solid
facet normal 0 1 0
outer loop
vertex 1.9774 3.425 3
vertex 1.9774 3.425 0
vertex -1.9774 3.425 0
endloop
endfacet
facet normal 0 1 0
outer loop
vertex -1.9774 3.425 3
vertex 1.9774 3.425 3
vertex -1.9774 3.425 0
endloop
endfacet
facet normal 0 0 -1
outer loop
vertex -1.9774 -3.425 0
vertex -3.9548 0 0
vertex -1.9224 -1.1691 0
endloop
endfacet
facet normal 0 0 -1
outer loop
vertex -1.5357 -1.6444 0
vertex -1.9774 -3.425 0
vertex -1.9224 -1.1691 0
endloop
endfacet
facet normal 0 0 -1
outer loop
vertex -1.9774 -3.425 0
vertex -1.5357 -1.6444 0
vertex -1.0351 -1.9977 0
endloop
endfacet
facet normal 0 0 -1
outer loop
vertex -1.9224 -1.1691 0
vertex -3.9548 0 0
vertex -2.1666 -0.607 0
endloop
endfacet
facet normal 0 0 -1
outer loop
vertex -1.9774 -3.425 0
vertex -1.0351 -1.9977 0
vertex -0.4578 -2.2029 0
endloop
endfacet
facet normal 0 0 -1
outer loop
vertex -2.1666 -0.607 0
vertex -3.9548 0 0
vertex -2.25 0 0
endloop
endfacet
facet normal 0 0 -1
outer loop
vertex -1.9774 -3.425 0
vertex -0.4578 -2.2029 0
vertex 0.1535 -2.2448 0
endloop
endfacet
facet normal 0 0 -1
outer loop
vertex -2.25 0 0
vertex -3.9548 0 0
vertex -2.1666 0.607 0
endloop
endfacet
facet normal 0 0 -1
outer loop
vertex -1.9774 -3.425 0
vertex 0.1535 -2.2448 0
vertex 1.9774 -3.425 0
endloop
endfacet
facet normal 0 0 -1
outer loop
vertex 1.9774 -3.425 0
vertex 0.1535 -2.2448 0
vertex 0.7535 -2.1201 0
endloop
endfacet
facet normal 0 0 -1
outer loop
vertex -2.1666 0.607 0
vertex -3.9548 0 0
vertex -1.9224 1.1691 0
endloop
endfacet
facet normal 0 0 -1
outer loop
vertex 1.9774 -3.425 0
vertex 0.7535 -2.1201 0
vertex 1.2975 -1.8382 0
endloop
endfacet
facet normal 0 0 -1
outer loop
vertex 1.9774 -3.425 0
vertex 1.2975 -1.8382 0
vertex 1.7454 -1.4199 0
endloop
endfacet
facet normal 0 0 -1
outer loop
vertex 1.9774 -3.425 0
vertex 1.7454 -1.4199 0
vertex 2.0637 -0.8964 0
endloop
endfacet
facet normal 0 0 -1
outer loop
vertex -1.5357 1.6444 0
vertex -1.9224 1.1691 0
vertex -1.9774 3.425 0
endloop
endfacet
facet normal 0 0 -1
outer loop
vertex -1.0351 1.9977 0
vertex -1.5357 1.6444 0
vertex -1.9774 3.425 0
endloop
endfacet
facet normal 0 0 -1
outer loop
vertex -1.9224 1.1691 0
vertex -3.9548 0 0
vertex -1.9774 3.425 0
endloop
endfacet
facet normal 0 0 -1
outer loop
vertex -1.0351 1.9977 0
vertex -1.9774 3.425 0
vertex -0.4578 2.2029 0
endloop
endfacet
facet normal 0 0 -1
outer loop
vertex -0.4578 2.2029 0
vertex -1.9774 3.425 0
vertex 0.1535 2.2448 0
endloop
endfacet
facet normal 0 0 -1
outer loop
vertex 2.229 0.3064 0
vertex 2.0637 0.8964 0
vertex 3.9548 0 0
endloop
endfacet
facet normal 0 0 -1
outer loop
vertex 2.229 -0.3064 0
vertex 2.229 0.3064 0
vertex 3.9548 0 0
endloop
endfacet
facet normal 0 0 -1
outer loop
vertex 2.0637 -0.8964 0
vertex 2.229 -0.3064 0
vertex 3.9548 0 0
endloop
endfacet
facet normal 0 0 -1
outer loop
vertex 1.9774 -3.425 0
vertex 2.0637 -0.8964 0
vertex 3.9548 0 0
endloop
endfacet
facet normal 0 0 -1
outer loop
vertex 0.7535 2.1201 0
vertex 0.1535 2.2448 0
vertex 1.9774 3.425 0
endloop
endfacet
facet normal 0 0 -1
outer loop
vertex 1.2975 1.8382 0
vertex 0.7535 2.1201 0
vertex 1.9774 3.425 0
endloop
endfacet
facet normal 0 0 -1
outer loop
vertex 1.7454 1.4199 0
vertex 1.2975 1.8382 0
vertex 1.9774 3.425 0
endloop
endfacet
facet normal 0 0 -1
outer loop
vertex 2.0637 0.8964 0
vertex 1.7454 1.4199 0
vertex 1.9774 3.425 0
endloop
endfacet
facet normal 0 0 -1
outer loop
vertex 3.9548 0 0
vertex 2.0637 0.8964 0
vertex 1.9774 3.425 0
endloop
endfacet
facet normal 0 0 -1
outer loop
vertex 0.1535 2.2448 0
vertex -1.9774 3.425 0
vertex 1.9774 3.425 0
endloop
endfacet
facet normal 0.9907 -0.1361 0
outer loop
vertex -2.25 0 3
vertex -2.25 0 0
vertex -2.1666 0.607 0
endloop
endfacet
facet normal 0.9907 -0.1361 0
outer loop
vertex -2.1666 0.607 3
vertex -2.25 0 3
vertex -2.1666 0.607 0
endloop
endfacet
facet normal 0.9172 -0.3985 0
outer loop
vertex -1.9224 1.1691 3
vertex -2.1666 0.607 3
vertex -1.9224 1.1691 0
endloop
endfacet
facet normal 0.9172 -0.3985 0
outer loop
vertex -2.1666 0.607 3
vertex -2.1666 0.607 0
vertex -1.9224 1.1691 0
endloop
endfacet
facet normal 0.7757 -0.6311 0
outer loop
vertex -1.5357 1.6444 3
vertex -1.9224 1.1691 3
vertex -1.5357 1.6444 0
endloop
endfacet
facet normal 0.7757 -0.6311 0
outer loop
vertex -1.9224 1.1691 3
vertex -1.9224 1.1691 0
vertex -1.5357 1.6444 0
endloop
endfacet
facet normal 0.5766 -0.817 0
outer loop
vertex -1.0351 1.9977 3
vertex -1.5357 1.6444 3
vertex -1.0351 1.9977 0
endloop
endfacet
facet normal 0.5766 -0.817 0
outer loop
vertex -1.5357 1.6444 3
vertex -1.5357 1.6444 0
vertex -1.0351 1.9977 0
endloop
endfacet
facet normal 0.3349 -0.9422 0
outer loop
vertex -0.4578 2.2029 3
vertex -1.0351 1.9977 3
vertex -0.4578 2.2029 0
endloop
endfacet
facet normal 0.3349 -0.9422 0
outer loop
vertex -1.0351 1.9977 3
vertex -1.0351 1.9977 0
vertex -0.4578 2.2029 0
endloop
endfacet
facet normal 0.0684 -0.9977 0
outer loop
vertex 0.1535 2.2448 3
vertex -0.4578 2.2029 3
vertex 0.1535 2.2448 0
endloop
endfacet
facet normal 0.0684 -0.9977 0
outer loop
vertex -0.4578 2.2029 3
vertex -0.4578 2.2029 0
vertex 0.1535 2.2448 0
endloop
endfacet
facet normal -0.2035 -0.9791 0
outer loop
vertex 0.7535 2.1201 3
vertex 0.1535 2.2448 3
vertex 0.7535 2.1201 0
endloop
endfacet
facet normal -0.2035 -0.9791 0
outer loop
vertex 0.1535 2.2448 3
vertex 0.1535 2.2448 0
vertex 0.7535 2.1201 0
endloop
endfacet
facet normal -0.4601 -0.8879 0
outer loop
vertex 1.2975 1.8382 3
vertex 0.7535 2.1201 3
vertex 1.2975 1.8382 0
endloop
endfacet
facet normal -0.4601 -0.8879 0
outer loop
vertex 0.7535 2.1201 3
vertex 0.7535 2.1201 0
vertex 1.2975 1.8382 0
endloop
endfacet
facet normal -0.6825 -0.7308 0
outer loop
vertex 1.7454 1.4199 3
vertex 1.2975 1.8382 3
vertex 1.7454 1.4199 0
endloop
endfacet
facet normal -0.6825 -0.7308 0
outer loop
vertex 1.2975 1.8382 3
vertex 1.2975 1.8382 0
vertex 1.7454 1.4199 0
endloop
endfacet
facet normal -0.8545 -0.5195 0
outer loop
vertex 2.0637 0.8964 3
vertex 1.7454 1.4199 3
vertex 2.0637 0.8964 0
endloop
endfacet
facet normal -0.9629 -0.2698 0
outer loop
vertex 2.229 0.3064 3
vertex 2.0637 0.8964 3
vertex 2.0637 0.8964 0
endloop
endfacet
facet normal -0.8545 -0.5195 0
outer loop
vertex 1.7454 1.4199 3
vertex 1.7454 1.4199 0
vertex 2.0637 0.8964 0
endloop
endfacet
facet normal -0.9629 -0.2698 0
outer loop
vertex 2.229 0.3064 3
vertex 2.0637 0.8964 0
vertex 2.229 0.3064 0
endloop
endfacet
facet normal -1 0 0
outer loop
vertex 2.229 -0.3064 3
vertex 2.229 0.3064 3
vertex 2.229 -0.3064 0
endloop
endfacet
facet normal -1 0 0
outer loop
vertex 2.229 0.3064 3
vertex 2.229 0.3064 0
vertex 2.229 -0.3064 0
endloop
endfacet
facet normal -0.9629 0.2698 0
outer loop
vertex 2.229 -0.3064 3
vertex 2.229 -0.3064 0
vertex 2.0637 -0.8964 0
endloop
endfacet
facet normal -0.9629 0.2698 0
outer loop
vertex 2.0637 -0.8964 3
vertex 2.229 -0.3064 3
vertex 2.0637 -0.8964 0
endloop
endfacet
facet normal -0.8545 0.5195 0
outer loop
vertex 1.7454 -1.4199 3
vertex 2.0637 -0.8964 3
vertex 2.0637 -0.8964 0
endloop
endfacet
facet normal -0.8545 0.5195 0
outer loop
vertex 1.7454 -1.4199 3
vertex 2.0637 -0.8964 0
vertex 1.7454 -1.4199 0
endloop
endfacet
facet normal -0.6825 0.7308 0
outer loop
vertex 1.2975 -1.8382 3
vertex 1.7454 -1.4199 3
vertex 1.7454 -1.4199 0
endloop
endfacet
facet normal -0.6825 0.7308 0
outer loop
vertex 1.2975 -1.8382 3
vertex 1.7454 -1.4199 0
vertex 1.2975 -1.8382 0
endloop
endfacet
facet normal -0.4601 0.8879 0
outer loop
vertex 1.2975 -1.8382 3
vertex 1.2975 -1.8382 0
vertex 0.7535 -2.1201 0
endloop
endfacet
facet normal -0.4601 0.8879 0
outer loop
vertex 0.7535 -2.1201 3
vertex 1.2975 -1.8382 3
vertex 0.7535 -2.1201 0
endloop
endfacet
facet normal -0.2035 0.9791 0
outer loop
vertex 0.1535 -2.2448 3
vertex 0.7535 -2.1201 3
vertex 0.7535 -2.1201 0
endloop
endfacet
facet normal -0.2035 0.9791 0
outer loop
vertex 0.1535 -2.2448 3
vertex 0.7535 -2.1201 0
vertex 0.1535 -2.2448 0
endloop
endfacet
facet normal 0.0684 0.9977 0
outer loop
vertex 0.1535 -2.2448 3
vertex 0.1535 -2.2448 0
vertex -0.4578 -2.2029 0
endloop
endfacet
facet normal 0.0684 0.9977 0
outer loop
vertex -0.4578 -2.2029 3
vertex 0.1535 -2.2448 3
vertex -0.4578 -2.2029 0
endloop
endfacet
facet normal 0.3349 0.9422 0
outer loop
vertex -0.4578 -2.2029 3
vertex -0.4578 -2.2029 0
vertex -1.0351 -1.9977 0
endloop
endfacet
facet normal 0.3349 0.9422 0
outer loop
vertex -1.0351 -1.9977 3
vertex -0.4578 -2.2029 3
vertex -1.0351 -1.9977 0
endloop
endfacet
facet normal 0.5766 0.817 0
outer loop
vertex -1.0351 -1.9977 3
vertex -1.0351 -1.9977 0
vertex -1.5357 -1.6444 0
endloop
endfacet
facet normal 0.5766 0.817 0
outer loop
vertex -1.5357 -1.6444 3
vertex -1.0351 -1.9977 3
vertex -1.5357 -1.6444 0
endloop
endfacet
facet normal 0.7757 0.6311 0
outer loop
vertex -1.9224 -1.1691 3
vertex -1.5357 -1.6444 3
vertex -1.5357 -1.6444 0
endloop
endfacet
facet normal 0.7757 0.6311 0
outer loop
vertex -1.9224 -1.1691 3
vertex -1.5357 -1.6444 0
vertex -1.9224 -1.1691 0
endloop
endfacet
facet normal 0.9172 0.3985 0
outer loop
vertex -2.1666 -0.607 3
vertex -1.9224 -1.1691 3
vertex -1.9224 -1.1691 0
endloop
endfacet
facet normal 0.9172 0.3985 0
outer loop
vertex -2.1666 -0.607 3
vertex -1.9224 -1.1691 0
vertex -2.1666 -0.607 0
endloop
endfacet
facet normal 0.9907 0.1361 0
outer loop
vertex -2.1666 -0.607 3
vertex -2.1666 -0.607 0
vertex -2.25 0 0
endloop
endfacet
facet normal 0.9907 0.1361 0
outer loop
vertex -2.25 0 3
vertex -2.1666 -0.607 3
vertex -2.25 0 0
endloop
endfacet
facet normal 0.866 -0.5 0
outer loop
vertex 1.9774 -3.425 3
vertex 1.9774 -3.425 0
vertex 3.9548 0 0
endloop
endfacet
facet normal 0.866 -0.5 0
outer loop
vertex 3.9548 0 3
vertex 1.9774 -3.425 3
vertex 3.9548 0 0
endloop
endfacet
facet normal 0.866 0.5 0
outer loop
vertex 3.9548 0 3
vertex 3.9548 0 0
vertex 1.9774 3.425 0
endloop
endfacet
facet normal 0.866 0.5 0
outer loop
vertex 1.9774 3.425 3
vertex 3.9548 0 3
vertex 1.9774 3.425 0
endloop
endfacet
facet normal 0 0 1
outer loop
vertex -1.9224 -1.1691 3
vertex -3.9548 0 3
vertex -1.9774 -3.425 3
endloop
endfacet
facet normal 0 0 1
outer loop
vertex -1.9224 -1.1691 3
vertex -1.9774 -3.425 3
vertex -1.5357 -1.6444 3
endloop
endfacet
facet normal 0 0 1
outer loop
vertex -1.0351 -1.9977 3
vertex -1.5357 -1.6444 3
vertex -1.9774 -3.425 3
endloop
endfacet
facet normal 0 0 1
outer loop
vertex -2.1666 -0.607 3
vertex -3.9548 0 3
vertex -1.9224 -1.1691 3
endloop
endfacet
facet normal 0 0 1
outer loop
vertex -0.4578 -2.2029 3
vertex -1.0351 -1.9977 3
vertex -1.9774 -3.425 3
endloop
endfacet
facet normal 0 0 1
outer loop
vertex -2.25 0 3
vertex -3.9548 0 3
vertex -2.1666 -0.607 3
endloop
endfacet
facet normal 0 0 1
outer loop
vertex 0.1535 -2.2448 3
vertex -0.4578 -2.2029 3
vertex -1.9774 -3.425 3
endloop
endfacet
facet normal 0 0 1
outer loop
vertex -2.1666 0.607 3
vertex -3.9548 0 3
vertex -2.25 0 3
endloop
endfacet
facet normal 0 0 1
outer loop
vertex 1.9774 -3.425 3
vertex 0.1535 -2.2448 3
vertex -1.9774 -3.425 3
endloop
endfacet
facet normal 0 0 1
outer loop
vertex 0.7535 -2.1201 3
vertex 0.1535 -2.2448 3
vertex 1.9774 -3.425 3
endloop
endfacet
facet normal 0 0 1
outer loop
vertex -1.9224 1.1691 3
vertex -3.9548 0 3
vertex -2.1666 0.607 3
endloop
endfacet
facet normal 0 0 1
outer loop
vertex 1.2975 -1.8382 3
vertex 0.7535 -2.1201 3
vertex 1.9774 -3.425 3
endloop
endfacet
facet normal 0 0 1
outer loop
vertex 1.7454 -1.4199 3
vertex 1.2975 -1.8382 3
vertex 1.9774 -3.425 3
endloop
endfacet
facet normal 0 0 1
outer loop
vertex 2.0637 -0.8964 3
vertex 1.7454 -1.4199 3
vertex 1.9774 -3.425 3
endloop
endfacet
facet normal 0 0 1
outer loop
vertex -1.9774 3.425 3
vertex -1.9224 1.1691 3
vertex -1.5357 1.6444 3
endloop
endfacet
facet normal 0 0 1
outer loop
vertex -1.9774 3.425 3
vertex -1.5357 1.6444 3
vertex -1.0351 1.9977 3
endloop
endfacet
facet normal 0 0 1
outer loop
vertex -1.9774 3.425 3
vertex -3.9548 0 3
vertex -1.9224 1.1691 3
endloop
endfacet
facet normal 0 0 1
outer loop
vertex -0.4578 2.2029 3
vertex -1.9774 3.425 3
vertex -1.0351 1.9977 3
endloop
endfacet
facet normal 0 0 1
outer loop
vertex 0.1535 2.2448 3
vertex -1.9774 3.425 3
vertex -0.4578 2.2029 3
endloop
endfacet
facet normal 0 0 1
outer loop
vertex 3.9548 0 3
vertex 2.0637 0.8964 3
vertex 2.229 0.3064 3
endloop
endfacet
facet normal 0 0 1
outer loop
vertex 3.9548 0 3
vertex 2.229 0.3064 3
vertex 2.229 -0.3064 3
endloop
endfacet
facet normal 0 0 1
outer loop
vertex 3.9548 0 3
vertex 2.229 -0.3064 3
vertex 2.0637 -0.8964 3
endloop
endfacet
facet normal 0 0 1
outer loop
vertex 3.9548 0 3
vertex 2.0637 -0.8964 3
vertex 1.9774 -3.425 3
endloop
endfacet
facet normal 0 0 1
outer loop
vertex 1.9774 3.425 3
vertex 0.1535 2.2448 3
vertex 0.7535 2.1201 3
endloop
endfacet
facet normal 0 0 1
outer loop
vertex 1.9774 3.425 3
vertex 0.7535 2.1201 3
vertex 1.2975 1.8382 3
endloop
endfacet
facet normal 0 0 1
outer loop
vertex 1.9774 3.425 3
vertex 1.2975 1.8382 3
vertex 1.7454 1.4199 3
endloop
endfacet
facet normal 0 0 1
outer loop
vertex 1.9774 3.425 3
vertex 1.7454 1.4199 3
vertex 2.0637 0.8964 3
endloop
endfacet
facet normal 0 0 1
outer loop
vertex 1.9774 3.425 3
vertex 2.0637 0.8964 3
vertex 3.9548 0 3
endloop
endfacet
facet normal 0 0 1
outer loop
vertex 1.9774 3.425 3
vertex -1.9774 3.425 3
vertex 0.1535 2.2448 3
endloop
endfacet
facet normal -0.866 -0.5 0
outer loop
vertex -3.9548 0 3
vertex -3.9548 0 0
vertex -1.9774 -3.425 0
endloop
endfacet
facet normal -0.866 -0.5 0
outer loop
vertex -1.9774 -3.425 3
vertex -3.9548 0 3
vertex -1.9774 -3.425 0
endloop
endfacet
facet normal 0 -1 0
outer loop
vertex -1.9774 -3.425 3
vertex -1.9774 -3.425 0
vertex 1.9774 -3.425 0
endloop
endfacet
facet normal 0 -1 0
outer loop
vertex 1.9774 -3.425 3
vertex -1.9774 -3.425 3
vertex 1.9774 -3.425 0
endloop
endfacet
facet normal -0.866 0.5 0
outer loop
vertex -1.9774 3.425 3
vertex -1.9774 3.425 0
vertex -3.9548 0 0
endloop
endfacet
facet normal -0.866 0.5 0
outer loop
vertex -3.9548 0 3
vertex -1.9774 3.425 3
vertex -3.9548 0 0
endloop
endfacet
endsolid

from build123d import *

# Parameters (mm, degrees)
EXTRUDE_1_DEPTH        = 3
HOLE_WIZARD_M4_1_D     = 4.5
HOLE_WIZARD_M4_1_DEPTH = 20
HOLE_WIZARD_M4_1_TIP   = 1.351936393


with BuildPart() as part:
    # ｽｹｯﾁ1 → ﾎﾞｽ - 押し出し1 (new body)
    with BuildSketch(Plane.XY):
        Polygon((3.954849344, 0), (1.977424672, 3.425), (-1.977424672, 3.425), (-3.954849344, 0), (-1.977424672, -3.425), (1.977424672, -3.425), align=None)
    extrude(amount=EXTRUDE_1_DEPTH)

    # M4 すきま穴1
    with Locations(Plane.XY.offset(3)):
        with Locations((0, 0)):
            Hole(HOLE_WIZARD_M4_1_D / 2, depth=HOLE_WIZARD_M4_1_DEPTH)
            with Locations((0, 0, -(HOLE_WIZARD_M4_1_DEPTH + HOLE_WIZARD_M4_1_TIP / 2))):  # 118° drill point
                Cone(0, HOLE_WIZARD_M4_1_D / 2, HOLE_WIZARD_M4_1_TIP, mode=Mode.SUBTRACT)


solid = part.part
